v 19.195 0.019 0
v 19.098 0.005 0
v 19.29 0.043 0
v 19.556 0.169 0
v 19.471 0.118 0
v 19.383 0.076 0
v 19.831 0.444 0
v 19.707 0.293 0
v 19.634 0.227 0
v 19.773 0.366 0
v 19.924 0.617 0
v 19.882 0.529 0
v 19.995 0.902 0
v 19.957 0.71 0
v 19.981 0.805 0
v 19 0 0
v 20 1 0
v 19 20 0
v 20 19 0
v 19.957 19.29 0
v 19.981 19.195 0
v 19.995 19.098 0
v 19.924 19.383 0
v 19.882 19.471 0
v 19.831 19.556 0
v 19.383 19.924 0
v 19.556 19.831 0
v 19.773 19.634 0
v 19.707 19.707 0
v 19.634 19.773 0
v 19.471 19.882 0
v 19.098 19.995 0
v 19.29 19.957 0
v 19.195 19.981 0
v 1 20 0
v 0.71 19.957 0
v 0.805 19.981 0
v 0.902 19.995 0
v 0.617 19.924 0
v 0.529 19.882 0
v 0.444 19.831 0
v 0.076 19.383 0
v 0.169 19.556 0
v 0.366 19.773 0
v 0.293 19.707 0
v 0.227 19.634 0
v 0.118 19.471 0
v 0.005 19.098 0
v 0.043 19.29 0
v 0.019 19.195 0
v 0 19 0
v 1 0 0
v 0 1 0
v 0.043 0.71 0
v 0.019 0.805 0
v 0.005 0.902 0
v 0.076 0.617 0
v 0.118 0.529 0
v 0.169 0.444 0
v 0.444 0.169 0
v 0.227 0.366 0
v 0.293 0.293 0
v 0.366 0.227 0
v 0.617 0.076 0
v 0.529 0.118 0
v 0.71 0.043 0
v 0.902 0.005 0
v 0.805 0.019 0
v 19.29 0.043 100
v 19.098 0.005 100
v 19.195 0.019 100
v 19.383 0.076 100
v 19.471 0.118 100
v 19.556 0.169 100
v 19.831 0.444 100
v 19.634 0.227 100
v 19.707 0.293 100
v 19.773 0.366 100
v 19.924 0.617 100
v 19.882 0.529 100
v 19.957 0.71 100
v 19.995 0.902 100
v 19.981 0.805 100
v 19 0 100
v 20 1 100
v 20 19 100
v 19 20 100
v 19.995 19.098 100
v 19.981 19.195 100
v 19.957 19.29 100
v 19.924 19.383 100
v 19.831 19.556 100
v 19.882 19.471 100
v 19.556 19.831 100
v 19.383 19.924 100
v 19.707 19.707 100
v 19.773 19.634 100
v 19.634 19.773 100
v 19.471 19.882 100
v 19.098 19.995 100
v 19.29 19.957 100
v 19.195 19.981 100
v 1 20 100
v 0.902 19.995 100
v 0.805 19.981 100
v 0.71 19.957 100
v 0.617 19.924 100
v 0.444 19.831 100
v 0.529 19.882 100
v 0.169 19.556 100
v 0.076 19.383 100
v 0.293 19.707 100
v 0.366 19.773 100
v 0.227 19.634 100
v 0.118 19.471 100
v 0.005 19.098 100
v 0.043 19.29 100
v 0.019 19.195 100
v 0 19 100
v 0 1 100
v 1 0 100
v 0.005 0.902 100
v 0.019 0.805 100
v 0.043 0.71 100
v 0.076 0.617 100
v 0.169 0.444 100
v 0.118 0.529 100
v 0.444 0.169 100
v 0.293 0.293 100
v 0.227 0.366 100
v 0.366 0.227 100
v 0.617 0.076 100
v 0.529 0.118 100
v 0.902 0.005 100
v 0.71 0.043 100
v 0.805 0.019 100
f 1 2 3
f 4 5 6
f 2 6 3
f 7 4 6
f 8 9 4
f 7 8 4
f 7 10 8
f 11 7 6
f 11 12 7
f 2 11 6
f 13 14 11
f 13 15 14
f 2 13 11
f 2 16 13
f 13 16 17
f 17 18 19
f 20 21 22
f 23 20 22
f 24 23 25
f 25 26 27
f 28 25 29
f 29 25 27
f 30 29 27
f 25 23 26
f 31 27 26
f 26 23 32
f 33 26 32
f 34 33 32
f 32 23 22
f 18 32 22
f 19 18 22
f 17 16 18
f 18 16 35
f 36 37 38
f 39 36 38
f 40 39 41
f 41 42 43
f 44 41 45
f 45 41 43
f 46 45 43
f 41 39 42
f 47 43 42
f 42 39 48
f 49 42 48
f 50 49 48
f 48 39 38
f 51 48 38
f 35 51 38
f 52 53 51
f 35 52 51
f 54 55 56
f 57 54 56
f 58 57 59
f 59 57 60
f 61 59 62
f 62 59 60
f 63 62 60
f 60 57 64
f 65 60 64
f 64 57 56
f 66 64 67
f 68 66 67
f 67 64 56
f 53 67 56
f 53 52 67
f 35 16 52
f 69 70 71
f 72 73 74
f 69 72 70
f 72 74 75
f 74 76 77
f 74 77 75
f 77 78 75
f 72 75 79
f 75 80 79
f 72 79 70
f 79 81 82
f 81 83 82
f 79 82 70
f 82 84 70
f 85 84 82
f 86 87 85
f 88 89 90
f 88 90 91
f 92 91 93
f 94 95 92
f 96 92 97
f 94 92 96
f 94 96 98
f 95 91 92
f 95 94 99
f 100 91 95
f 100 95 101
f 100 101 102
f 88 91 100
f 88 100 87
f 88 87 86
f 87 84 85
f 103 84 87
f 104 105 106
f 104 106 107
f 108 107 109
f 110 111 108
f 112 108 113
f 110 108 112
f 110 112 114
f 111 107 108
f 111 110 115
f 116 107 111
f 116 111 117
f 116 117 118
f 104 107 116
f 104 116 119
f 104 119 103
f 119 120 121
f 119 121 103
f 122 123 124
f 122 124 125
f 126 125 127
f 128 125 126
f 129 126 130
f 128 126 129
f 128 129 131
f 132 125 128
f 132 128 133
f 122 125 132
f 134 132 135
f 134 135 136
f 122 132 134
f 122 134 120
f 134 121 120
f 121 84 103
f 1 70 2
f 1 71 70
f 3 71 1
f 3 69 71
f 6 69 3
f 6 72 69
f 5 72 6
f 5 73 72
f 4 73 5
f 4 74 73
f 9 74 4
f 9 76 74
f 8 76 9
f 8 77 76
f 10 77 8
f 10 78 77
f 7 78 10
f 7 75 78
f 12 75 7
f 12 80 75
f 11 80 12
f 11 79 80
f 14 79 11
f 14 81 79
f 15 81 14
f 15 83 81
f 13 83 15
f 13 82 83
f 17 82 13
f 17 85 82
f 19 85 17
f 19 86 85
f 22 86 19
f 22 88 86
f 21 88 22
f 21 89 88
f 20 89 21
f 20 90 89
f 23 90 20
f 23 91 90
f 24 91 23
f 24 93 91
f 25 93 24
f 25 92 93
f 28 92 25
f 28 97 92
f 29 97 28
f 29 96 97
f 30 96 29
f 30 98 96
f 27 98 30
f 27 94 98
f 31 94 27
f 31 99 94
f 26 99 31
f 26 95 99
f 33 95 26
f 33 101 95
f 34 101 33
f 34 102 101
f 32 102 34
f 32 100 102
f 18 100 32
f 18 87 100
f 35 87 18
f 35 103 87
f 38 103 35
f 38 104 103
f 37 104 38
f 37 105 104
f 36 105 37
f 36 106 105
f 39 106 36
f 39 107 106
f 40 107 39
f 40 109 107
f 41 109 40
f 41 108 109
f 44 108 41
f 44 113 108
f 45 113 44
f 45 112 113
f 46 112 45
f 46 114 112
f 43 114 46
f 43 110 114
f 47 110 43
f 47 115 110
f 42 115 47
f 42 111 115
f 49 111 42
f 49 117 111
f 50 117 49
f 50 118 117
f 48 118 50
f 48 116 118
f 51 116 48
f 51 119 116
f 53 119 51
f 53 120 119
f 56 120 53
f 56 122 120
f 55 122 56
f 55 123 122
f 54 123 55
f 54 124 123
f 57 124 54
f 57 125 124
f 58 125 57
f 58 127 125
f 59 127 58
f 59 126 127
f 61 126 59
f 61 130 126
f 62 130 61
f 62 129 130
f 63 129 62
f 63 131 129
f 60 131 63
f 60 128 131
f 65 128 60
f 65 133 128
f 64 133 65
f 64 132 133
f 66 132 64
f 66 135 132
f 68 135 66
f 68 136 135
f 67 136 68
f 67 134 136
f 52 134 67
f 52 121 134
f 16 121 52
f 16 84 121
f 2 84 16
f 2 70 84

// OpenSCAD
$fn = 64;

length = 100;
size = 20;
corner_r = 1.0;

module extrusion_2020(len=100, s=20, r=1.0){
    linear_extrude(height=len, center=false, convexity=10)
        offset(r=r)
            offset(delta=-r)
                square([s, s], center=false);
}

extrusion_2020(length, size, corner_r);
